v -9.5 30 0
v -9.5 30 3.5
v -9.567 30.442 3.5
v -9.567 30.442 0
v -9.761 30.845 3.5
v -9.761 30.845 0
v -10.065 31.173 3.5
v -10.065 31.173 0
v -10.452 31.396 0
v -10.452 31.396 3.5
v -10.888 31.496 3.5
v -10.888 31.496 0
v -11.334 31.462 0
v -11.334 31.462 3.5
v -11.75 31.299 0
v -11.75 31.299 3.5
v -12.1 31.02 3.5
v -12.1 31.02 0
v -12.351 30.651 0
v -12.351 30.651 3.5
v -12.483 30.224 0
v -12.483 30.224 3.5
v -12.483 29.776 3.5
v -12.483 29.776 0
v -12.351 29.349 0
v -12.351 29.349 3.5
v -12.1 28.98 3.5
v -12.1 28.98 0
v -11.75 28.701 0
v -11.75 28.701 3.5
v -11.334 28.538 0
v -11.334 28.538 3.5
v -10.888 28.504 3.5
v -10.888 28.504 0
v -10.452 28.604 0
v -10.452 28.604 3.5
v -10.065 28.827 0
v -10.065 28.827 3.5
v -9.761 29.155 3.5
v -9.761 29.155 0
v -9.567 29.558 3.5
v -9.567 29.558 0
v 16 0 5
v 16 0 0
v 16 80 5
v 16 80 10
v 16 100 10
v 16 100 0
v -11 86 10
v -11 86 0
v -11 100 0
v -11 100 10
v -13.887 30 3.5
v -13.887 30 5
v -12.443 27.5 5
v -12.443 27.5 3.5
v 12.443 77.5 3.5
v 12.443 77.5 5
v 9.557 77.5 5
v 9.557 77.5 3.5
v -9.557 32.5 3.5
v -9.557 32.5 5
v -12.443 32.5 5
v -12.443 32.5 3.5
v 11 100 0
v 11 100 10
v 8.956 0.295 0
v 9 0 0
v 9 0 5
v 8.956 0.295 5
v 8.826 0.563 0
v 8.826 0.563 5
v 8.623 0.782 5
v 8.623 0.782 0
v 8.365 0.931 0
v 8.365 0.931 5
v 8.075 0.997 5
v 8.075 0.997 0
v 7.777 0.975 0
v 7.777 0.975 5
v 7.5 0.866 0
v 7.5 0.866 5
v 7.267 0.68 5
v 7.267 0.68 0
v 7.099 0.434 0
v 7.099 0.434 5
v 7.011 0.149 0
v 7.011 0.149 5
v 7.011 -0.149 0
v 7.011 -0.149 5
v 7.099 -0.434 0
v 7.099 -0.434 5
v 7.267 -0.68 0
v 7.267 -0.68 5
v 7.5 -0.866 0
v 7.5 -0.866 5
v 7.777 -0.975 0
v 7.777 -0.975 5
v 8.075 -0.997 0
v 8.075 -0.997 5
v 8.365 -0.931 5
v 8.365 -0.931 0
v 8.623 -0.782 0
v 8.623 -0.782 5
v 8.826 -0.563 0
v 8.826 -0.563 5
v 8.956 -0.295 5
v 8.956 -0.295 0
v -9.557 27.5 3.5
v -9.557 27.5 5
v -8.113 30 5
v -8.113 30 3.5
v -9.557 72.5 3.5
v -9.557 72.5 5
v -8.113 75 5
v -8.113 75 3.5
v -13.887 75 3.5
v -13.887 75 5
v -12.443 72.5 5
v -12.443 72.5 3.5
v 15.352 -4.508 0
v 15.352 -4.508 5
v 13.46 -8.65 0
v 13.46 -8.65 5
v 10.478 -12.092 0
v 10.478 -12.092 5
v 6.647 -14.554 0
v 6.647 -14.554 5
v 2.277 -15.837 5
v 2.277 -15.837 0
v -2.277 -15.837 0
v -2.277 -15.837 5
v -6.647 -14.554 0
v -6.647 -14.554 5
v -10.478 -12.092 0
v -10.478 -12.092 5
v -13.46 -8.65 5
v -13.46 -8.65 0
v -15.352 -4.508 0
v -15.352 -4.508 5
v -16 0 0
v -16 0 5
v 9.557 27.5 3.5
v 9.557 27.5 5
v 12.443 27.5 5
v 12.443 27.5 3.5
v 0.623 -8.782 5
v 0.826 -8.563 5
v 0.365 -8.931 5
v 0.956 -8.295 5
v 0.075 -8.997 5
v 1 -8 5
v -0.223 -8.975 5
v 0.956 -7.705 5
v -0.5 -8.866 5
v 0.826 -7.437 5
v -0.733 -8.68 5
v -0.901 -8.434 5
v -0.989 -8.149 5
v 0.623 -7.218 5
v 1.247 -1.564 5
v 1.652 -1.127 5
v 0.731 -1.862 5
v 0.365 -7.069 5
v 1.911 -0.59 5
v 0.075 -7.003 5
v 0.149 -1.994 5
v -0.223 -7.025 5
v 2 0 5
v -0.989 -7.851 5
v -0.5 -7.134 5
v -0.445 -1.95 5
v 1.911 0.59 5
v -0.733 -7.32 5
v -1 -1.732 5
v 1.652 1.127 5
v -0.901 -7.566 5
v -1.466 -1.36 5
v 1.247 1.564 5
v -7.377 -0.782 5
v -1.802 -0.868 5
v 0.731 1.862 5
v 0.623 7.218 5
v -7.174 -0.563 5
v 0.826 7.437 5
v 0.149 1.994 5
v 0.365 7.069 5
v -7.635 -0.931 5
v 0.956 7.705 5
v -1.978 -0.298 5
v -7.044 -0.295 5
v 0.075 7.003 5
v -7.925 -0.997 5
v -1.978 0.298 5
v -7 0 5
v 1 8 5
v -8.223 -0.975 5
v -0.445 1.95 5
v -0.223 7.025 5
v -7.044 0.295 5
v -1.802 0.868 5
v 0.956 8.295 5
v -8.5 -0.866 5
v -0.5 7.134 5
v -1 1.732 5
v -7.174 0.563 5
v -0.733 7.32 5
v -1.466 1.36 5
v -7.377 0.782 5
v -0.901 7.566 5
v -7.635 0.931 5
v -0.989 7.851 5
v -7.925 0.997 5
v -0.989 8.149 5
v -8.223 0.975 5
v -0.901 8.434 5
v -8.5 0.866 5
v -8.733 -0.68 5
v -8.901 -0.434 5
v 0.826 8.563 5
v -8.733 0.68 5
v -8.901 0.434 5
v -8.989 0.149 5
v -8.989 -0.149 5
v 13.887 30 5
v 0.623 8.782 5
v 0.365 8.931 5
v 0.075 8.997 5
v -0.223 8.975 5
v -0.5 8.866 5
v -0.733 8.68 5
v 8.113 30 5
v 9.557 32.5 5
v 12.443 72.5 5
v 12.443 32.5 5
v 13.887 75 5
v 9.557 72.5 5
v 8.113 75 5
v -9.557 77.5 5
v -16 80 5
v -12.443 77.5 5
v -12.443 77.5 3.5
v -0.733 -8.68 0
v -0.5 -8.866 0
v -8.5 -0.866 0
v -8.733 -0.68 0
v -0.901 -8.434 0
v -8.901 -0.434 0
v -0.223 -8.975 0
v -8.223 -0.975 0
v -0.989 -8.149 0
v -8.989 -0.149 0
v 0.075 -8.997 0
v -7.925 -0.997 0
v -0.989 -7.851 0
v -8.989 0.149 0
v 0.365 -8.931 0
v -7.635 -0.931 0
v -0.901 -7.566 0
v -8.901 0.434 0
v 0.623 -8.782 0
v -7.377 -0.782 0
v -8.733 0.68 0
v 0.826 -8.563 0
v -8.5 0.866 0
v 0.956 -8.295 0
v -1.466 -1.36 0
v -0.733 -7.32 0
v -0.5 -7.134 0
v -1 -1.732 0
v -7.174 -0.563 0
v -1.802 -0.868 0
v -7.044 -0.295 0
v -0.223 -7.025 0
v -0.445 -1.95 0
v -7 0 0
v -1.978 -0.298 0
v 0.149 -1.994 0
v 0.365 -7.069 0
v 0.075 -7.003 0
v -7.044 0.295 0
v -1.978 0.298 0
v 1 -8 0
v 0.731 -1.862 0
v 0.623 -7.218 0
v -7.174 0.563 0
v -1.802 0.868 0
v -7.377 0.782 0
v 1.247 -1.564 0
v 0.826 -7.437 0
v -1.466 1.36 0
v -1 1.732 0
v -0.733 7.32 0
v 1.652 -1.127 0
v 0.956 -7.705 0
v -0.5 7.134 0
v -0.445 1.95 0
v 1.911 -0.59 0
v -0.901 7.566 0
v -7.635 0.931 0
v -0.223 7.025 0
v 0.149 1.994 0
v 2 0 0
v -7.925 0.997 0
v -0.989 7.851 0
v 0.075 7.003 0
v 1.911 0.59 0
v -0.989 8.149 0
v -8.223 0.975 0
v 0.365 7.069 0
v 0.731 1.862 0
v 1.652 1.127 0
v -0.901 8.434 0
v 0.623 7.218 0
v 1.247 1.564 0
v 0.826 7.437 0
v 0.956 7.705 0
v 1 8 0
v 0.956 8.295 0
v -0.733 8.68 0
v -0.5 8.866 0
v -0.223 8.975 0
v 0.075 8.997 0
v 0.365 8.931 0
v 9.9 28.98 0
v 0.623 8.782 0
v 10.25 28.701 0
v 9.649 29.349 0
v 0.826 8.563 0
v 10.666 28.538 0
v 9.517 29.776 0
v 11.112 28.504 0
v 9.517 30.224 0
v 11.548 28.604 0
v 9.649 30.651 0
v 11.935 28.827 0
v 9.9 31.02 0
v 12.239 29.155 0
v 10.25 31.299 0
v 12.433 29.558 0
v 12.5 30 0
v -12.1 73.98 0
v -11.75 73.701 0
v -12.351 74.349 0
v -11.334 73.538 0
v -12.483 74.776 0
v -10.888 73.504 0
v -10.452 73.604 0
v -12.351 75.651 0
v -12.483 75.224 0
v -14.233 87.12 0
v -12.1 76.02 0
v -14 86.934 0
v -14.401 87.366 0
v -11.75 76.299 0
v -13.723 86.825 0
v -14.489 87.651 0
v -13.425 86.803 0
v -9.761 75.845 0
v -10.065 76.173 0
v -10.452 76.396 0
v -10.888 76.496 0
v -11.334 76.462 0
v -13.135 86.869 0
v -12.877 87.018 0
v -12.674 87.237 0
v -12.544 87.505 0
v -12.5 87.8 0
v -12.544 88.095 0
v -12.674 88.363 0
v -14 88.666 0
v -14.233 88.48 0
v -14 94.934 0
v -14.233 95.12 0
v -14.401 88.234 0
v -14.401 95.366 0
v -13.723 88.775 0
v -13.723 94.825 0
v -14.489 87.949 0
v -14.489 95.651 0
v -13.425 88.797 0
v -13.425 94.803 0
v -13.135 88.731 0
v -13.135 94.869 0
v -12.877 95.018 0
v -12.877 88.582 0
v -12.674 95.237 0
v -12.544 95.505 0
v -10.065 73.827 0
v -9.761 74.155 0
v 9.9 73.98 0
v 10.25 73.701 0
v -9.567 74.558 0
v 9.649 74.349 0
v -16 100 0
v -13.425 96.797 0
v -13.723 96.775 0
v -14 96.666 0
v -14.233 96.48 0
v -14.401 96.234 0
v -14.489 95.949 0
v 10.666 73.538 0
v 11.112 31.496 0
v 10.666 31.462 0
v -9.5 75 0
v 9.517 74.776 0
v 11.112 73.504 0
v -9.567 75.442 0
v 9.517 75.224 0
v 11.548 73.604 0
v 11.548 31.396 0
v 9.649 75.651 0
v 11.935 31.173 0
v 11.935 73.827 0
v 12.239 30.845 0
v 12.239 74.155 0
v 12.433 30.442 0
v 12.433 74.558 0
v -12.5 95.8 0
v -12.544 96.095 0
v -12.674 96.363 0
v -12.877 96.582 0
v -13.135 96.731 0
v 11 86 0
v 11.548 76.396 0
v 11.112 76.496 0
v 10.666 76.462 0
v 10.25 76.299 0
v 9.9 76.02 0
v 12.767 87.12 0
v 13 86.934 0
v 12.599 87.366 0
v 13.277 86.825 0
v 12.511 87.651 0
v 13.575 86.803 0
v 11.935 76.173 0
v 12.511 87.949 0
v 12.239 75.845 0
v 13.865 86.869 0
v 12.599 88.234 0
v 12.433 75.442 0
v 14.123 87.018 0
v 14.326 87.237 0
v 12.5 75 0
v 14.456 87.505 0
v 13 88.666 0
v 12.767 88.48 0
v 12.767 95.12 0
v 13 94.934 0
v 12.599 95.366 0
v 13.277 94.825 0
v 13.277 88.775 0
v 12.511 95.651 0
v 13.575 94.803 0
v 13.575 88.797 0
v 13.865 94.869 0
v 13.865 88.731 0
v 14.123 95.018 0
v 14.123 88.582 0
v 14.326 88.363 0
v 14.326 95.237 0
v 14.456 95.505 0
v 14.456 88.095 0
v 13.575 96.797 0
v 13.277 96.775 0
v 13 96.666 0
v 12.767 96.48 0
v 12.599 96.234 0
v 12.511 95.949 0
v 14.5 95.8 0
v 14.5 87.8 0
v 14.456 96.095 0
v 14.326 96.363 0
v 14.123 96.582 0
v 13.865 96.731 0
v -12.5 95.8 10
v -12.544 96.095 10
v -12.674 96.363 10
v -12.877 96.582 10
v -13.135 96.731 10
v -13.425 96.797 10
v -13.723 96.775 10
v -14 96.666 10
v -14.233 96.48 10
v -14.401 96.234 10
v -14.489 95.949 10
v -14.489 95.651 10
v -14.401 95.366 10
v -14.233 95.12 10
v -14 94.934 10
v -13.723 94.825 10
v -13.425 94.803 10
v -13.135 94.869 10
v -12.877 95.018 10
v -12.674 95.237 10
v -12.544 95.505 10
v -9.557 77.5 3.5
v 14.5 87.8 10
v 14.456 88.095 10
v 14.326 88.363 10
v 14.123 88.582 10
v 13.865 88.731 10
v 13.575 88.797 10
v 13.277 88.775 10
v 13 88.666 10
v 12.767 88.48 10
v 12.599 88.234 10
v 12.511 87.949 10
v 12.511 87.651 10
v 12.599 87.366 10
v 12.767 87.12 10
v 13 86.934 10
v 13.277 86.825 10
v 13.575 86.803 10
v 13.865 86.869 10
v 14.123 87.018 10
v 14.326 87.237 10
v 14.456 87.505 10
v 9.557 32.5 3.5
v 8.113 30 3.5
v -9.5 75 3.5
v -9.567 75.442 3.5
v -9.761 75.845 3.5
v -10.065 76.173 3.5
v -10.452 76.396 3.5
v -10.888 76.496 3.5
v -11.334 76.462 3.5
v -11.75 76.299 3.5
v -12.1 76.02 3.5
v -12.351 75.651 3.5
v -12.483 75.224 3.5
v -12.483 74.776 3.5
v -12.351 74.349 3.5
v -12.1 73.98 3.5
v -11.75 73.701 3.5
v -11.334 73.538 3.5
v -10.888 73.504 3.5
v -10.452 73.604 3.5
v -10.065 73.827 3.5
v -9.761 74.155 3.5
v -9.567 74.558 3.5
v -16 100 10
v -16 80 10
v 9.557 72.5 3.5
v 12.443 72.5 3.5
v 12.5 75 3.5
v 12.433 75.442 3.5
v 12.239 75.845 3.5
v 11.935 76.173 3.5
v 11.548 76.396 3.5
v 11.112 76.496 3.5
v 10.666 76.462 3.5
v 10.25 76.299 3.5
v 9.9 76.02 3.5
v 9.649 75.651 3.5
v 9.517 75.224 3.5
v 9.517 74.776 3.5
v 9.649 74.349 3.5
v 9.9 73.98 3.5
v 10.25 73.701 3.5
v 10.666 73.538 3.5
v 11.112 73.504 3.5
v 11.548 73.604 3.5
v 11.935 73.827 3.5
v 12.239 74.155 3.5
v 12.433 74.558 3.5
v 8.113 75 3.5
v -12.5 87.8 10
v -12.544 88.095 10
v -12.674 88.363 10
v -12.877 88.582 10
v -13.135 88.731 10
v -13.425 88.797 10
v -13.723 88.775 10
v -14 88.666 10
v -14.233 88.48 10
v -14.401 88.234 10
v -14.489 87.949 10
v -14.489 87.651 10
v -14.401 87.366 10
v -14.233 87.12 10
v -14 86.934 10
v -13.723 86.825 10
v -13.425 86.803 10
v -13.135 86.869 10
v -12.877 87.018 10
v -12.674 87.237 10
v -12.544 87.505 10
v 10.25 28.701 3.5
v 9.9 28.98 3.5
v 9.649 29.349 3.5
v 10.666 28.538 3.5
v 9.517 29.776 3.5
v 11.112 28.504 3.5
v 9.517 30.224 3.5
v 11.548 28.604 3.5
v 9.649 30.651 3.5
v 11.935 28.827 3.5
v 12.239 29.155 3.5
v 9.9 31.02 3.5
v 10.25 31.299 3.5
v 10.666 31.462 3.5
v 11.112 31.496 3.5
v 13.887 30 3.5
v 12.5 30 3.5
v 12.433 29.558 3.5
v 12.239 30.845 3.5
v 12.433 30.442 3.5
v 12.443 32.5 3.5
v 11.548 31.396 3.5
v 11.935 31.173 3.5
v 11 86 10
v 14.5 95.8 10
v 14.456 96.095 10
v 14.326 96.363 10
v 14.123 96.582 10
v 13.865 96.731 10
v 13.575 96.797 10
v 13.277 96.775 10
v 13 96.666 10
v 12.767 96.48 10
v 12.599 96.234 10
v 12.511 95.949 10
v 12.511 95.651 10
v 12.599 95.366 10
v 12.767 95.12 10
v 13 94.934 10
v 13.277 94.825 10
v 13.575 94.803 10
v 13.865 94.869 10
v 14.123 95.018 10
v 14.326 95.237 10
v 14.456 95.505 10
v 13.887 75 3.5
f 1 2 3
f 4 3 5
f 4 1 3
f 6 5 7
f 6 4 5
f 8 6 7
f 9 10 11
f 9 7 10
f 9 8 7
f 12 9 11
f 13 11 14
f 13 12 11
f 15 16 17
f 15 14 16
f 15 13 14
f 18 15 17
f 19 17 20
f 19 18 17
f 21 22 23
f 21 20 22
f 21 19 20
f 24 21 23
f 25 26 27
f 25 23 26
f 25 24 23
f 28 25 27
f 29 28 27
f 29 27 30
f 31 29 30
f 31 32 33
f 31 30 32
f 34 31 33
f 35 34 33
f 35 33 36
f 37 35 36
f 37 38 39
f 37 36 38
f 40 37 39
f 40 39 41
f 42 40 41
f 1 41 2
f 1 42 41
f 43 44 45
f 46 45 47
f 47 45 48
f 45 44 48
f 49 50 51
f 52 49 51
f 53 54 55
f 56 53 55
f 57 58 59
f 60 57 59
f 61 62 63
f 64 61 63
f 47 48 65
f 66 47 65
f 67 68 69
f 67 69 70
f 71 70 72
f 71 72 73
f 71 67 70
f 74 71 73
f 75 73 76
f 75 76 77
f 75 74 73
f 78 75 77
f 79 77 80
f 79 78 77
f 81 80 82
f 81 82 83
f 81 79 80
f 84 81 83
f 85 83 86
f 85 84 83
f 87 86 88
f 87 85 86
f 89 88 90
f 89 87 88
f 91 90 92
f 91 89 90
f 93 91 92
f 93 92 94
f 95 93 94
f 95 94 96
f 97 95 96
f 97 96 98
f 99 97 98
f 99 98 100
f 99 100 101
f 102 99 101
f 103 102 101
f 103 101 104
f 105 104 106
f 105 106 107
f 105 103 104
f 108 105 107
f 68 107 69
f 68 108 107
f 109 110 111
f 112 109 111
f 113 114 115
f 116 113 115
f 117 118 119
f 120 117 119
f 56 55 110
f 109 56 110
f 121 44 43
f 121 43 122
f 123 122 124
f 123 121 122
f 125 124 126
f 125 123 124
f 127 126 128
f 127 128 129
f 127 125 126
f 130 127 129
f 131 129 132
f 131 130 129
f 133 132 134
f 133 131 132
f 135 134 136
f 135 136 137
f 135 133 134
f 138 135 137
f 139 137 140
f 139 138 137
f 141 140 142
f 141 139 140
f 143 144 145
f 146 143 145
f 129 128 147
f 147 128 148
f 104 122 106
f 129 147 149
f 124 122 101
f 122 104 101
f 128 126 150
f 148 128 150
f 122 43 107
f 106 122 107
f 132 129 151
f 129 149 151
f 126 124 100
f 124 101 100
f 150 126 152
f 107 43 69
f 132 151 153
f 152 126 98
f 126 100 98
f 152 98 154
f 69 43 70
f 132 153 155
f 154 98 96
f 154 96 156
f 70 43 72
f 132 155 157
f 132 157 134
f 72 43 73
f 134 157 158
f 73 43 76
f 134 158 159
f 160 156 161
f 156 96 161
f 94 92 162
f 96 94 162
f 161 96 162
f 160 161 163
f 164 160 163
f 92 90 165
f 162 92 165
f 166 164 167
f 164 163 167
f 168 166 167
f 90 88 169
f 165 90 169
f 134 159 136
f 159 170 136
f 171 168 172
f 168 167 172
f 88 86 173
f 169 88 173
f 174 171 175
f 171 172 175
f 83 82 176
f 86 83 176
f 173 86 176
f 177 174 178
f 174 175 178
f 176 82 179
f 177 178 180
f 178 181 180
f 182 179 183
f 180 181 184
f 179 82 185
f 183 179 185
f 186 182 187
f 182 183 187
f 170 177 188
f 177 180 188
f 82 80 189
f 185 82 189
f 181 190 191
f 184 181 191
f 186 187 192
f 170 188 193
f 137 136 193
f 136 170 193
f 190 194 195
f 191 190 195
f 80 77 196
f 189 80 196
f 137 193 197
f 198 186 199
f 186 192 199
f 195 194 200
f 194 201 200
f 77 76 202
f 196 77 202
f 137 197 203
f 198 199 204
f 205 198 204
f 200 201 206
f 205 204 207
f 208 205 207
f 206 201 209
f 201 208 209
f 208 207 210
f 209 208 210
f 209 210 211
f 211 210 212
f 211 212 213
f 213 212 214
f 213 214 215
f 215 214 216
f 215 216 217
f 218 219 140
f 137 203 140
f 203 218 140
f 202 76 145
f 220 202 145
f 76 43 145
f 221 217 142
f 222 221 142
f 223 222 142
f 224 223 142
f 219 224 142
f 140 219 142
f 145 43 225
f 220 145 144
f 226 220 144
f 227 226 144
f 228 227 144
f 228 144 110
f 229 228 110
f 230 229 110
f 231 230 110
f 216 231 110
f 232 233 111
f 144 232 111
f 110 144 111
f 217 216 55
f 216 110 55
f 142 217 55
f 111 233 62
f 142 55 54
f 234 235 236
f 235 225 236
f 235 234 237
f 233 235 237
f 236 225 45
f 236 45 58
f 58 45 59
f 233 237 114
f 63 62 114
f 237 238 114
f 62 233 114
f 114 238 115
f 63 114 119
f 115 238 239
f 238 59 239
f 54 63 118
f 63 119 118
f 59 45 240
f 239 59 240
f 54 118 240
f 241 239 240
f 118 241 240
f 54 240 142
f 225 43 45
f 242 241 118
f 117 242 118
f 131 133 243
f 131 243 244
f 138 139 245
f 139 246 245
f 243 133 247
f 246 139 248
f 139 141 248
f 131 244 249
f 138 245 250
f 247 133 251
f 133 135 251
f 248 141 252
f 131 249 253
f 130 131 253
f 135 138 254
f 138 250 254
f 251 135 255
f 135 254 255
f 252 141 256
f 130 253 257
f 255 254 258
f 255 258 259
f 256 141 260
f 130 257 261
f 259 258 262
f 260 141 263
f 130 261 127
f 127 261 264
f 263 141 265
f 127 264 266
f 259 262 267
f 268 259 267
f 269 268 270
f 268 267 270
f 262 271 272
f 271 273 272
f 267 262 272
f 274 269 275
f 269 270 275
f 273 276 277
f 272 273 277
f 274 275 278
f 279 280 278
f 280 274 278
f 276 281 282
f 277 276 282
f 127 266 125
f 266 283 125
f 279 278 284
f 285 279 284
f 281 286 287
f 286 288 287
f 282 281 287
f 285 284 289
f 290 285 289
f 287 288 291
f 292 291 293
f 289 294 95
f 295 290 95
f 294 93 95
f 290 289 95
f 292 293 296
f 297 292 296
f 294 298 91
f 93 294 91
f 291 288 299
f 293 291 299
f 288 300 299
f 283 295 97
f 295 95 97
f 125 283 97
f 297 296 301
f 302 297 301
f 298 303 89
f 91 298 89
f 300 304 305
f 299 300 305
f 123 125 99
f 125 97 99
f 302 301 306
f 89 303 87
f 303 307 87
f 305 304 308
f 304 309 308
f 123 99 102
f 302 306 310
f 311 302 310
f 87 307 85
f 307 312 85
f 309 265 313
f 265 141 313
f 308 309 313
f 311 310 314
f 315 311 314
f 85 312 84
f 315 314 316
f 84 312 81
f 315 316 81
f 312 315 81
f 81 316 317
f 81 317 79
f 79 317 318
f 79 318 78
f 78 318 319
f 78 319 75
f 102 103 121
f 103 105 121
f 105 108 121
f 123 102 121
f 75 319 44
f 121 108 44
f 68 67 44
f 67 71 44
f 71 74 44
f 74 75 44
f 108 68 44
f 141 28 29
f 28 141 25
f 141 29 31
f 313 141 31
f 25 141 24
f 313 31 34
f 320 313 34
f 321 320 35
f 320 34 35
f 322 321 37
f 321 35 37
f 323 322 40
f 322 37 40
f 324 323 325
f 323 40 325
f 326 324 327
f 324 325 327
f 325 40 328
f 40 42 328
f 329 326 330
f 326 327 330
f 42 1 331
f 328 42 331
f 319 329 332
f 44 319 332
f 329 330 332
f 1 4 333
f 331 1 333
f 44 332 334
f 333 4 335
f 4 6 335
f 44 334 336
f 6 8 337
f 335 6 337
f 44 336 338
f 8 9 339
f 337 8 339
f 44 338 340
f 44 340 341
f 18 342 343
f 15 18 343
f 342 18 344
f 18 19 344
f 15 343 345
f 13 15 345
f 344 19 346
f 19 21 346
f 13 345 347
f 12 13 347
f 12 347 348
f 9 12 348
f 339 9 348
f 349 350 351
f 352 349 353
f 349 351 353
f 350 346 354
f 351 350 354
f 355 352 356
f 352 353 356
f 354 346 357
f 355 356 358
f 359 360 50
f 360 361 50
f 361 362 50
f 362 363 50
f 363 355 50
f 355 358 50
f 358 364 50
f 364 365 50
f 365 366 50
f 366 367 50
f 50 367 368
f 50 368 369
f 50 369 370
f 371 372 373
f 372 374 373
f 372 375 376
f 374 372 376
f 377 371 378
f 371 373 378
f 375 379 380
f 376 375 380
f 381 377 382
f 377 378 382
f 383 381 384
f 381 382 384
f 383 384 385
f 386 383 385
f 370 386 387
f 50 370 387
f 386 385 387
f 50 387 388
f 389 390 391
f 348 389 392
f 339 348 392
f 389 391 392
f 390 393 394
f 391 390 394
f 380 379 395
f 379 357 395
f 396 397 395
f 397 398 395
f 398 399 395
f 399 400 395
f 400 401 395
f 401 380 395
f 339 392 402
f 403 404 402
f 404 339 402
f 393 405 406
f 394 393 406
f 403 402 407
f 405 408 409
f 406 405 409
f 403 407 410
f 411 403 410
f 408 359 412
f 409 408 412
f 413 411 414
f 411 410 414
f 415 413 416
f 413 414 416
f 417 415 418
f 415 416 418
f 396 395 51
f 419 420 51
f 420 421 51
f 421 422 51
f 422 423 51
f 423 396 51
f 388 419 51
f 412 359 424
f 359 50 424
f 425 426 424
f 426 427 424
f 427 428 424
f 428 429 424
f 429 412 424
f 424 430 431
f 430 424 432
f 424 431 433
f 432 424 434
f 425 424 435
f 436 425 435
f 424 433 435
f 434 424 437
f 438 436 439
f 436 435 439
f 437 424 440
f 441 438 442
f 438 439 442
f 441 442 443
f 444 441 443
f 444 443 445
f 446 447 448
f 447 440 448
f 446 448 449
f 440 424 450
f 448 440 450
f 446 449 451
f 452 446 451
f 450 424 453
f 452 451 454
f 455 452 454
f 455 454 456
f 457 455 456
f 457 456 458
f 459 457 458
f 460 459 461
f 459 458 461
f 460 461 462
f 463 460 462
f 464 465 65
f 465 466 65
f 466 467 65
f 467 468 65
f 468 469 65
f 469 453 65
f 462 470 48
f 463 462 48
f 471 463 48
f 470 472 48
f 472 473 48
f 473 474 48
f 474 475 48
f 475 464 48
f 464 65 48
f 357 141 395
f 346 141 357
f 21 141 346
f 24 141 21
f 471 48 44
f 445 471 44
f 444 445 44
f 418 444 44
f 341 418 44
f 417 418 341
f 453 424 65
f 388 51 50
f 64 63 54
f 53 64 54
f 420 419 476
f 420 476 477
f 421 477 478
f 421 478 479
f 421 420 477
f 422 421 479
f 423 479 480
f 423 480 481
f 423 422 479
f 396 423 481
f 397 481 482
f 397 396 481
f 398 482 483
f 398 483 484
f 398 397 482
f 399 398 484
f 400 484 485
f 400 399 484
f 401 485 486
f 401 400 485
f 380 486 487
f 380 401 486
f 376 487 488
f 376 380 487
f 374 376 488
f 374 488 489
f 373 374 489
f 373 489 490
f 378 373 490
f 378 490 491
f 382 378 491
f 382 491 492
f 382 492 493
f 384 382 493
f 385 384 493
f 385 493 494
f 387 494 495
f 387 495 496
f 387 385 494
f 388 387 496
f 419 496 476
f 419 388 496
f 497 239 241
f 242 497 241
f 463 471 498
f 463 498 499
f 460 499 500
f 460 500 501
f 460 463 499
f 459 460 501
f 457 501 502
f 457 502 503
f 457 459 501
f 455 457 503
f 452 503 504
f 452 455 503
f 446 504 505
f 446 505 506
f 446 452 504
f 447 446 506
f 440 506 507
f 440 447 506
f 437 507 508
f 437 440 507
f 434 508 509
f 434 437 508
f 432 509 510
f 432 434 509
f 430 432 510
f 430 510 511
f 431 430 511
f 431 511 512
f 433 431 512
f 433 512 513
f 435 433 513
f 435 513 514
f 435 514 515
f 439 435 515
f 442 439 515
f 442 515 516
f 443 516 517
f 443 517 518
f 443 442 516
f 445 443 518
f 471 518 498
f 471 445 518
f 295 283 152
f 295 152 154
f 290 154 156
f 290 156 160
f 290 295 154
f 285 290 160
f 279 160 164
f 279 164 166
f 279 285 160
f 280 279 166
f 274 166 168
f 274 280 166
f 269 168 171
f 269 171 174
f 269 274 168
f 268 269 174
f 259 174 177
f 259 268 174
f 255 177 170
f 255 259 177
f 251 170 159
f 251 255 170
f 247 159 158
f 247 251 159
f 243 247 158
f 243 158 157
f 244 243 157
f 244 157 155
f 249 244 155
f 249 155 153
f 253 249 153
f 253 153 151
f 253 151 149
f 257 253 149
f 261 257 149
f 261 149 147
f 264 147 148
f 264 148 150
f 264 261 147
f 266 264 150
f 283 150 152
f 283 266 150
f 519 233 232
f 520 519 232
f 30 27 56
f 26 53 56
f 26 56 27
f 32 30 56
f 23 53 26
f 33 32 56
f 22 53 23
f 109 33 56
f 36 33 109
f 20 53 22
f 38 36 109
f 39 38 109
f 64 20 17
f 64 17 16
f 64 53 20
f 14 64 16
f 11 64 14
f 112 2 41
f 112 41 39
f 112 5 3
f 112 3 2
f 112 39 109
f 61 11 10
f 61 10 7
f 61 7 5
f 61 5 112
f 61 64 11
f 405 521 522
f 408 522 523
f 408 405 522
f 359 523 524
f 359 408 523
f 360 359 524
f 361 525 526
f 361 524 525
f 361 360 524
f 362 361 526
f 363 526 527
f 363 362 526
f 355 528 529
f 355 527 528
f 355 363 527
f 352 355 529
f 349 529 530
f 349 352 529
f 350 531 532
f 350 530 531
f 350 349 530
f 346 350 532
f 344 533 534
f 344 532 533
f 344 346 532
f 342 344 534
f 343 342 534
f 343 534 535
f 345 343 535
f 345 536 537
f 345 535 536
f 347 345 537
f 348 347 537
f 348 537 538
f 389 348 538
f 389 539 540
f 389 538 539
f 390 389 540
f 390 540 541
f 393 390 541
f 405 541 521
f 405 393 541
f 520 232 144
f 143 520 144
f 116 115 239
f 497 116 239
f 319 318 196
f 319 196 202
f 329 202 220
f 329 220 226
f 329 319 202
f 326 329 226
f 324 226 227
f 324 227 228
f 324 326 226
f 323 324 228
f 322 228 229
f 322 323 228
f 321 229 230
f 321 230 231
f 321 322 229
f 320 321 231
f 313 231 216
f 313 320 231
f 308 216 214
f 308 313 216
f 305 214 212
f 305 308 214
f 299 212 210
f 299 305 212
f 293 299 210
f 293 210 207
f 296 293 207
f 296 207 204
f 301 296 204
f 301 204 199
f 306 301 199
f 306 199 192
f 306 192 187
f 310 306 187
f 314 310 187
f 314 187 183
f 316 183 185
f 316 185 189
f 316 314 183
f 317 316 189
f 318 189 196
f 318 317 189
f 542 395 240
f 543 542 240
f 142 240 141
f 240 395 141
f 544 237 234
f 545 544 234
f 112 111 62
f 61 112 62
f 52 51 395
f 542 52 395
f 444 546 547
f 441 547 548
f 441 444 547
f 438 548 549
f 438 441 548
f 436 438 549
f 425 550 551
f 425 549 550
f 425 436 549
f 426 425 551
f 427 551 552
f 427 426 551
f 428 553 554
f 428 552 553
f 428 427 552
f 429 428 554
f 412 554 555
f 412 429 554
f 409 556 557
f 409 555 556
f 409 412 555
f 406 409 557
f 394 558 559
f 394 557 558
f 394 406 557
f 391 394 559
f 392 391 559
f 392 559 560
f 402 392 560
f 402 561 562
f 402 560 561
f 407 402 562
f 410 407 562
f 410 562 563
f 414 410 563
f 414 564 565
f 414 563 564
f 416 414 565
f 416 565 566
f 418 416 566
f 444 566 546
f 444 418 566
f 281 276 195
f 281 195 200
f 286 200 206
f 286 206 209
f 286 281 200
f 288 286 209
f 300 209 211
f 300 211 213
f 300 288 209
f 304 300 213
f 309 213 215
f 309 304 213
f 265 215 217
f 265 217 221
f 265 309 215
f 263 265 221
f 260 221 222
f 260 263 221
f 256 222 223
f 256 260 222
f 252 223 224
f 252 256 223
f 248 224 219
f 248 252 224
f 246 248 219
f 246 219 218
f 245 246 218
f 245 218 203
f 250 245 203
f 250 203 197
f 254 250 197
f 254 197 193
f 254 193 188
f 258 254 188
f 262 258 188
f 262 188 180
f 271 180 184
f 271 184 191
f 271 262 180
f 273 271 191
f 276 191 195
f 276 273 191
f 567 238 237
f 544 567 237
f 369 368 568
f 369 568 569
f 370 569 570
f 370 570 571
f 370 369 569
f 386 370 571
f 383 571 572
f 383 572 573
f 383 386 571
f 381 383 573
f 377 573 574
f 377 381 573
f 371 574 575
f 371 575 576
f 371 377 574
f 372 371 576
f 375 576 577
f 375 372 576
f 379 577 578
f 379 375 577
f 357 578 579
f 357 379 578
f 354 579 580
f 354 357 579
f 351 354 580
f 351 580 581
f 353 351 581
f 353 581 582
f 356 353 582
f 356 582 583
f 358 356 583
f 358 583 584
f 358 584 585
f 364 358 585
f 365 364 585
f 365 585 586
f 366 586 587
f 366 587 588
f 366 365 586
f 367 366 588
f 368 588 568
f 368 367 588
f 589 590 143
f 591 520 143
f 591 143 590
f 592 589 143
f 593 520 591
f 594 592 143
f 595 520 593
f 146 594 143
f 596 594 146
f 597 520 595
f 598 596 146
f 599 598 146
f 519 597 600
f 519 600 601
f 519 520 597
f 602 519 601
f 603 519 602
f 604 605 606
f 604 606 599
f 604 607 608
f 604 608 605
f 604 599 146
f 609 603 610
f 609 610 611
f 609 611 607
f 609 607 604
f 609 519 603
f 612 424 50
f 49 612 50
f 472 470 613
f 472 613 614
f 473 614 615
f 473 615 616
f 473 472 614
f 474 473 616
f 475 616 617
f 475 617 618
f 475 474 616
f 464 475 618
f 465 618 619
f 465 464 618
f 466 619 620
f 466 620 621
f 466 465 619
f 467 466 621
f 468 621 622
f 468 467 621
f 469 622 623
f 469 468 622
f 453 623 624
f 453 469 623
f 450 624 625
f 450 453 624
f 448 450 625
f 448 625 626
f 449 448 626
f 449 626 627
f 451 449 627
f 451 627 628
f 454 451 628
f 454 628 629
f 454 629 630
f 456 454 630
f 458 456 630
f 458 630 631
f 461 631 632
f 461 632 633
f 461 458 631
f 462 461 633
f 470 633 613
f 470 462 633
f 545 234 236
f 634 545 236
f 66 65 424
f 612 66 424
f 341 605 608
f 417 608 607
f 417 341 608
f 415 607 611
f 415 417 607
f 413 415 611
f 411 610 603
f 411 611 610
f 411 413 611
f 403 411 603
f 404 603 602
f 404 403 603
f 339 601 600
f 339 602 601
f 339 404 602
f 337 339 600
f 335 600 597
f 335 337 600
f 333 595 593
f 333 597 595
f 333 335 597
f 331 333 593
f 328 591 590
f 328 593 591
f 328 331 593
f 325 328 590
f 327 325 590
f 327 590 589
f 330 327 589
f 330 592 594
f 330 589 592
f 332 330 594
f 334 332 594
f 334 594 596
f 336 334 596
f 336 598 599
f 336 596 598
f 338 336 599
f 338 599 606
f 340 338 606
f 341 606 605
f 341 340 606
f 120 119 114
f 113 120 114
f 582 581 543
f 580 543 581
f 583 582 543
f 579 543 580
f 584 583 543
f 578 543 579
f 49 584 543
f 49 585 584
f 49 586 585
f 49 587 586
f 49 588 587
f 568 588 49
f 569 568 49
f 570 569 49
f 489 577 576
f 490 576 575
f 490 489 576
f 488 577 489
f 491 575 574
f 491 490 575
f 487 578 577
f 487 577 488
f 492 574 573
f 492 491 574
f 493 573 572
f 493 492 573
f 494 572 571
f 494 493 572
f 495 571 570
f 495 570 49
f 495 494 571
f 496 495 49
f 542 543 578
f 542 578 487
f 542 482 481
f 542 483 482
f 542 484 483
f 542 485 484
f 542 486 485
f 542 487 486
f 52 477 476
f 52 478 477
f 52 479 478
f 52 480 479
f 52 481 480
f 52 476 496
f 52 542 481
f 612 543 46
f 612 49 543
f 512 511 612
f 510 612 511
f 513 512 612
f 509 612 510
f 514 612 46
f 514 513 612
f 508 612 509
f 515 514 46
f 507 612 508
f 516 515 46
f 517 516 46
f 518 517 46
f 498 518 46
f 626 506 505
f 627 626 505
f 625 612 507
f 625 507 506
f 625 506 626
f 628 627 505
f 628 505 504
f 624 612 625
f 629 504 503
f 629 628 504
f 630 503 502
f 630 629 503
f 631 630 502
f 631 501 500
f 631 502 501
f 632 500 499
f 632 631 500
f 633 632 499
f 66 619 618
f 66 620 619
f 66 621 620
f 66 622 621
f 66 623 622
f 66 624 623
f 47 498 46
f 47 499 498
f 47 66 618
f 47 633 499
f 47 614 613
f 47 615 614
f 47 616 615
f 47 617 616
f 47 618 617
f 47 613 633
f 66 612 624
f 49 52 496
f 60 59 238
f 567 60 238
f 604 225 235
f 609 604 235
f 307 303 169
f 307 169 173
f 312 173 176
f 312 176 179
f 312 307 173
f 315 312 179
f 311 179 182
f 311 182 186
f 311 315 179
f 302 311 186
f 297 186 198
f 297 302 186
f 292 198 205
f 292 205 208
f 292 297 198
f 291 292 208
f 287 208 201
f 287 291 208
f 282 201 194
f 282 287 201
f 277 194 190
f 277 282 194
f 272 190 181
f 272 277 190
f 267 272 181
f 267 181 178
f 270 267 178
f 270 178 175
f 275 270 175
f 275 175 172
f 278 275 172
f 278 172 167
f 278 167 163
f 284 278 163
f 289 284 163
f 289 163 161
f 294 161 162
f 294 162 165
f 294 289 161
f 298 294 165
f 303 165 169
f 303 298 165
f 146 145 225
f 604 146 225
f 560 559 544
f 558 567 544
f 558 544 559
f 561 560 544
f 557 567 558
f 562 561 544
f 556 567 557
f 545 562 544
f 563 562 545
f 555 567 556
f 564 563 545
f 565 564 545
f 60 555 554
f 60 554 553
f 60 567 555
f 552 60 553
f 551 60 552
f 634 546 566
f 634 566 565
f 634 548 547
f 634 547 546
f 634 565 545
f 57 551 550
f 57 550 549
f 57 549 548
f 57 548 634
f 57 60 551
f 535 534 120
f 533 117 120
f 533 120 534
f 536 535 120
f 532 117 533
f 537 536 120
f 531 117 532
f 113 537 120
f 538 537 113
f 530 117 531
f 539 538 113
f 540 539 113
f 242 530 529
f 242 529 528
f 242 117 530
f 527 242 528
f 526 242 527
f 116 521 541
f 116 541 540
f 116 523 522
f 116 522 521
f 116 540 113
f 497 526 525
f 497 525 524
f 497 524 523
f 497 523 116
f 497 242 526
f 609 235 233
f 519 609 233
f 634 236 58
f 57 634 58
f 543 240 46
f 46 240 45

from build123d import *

# Parameters (mm, degrees)
SKETCH1_R           = 1
SKETCH1_R_2         = 2
SKETCH1_R_3         = 1.5
BOSS_EXTRUDE1_DEPTH = 5
SKETCH3_R           = 1
BOSS_EXTRUDE2_DEPTH = 10
CUT_EXTRUDE1_DEPTH  = 1.5


with BuildPart() as part:
    # Sketch1 → Boss-Extrude1 (new body)
    with BuildSketch(Plane.XY):
        with BuildLine():
            Line((-16, 0), (-16, 80))
            Line((-16, 80), (16, 80))
            Line((16, 80), (16, 0))
            ThreePointArc((16, 0), (0, -16), (-16, 0))
        make_face()
        with Locations((0, -8)):
            Circle(SKETCH1_R, mode=Mode.SUBTRACT)
        Circle(SKETCH1_R_2, mode=Mode.SUBTRACT)
        with Locations((-8, 0)):
            Circle(SKETCH1_R, mode=Mode.SUBTRACT)
        with Locations((0, 8)):
            Circle(SKETCH1_R, mode=Mode.SUBTRACT)
        with Locations((8, 0)):
            Circle(SKETCH1_R, mode=Mode.SUBTRACT)
        with Locations((11, 75)):
            Circle(SKETCH1_R_3, mode=Mode.SUBTRACT)
        with Locations((-11, 75)):
            Circle(SKETCH1_R_3, mode=Mode.SUBTRACT)
        with Locations((-11, 30)):
            Circle(SKETCH1_R_3, mode=Mode.SUBTRACT)
        with Locations((11, 30)):
            Circle(SKETCH1_R_3, mode=Mode.SUBTRACT)
    extrude(amount=BOSS_EXTRUDE1_DEPTH)

    # Sketch3 → Boss-Extrude2 (add)
    with BuildSketch(Plane.XY):
        Polygon((-16, 80), (16, 80), (16, 100), (11, 100), (11, 86), (-11, 86), (-11, 100), (-16, 100), align=None)
        with Locations((-13.5, 95.8)):
            Circle(SKETCH3_R, mode=Mode.SUBTRACT)
        with Locations((13.5, 95.8)):
            Circle(SKETCH3_R, mode=Mode.SUBTRACT)
        with Locations((13.5, 87.8)):
            Circle(SKETCH3_R, mode=Mode.SUBTRACT)
        with Locations((-13.5, 87.8)):
            Circle(SKETCH3_R, mode=Mode.SUBTRACT)
    extrude(amount=BOSS_EXTRUDE2_DEPTH)

    # Sketch5 → Cut-Extrude1 (cut)
    with BuildSketch(Plane.XY.offset(5)):
        Polygon((-8.113248654, 75), (-9.556624327, 77.5), (-12.443375673, 77.5), (-13.886751346, 75), (-12.443375673, 72.5), (-9.556624327, 72.5), align=None)
        Polygon((-8.113248654, 30), (-9.556624327, 32.5), (-12.443375673, 32.5), (-13.886751346, 30), (-12.443375673, 27.5), (-9.556624327, 27.5), align=None)
        Polygon((13.886751346, 30), (12.443375673, 32.5), (9.556624327, 32.5), (8.113248654, 30), (9.556624327, 27.5), (12.443375673, 27.5), align=None)
        Polygon((13.886751346, 75), (12.443375673, 77.5), (9.556624327, 77.5), (8.113248654, 75), (9.556624327, 72.5), (12.443375673, 72.5), align=None)
    extrude(amount=-CUT_EXTRUDE1_DEPTH, mode=Mode.SUBTRACT)


solid = part.part
